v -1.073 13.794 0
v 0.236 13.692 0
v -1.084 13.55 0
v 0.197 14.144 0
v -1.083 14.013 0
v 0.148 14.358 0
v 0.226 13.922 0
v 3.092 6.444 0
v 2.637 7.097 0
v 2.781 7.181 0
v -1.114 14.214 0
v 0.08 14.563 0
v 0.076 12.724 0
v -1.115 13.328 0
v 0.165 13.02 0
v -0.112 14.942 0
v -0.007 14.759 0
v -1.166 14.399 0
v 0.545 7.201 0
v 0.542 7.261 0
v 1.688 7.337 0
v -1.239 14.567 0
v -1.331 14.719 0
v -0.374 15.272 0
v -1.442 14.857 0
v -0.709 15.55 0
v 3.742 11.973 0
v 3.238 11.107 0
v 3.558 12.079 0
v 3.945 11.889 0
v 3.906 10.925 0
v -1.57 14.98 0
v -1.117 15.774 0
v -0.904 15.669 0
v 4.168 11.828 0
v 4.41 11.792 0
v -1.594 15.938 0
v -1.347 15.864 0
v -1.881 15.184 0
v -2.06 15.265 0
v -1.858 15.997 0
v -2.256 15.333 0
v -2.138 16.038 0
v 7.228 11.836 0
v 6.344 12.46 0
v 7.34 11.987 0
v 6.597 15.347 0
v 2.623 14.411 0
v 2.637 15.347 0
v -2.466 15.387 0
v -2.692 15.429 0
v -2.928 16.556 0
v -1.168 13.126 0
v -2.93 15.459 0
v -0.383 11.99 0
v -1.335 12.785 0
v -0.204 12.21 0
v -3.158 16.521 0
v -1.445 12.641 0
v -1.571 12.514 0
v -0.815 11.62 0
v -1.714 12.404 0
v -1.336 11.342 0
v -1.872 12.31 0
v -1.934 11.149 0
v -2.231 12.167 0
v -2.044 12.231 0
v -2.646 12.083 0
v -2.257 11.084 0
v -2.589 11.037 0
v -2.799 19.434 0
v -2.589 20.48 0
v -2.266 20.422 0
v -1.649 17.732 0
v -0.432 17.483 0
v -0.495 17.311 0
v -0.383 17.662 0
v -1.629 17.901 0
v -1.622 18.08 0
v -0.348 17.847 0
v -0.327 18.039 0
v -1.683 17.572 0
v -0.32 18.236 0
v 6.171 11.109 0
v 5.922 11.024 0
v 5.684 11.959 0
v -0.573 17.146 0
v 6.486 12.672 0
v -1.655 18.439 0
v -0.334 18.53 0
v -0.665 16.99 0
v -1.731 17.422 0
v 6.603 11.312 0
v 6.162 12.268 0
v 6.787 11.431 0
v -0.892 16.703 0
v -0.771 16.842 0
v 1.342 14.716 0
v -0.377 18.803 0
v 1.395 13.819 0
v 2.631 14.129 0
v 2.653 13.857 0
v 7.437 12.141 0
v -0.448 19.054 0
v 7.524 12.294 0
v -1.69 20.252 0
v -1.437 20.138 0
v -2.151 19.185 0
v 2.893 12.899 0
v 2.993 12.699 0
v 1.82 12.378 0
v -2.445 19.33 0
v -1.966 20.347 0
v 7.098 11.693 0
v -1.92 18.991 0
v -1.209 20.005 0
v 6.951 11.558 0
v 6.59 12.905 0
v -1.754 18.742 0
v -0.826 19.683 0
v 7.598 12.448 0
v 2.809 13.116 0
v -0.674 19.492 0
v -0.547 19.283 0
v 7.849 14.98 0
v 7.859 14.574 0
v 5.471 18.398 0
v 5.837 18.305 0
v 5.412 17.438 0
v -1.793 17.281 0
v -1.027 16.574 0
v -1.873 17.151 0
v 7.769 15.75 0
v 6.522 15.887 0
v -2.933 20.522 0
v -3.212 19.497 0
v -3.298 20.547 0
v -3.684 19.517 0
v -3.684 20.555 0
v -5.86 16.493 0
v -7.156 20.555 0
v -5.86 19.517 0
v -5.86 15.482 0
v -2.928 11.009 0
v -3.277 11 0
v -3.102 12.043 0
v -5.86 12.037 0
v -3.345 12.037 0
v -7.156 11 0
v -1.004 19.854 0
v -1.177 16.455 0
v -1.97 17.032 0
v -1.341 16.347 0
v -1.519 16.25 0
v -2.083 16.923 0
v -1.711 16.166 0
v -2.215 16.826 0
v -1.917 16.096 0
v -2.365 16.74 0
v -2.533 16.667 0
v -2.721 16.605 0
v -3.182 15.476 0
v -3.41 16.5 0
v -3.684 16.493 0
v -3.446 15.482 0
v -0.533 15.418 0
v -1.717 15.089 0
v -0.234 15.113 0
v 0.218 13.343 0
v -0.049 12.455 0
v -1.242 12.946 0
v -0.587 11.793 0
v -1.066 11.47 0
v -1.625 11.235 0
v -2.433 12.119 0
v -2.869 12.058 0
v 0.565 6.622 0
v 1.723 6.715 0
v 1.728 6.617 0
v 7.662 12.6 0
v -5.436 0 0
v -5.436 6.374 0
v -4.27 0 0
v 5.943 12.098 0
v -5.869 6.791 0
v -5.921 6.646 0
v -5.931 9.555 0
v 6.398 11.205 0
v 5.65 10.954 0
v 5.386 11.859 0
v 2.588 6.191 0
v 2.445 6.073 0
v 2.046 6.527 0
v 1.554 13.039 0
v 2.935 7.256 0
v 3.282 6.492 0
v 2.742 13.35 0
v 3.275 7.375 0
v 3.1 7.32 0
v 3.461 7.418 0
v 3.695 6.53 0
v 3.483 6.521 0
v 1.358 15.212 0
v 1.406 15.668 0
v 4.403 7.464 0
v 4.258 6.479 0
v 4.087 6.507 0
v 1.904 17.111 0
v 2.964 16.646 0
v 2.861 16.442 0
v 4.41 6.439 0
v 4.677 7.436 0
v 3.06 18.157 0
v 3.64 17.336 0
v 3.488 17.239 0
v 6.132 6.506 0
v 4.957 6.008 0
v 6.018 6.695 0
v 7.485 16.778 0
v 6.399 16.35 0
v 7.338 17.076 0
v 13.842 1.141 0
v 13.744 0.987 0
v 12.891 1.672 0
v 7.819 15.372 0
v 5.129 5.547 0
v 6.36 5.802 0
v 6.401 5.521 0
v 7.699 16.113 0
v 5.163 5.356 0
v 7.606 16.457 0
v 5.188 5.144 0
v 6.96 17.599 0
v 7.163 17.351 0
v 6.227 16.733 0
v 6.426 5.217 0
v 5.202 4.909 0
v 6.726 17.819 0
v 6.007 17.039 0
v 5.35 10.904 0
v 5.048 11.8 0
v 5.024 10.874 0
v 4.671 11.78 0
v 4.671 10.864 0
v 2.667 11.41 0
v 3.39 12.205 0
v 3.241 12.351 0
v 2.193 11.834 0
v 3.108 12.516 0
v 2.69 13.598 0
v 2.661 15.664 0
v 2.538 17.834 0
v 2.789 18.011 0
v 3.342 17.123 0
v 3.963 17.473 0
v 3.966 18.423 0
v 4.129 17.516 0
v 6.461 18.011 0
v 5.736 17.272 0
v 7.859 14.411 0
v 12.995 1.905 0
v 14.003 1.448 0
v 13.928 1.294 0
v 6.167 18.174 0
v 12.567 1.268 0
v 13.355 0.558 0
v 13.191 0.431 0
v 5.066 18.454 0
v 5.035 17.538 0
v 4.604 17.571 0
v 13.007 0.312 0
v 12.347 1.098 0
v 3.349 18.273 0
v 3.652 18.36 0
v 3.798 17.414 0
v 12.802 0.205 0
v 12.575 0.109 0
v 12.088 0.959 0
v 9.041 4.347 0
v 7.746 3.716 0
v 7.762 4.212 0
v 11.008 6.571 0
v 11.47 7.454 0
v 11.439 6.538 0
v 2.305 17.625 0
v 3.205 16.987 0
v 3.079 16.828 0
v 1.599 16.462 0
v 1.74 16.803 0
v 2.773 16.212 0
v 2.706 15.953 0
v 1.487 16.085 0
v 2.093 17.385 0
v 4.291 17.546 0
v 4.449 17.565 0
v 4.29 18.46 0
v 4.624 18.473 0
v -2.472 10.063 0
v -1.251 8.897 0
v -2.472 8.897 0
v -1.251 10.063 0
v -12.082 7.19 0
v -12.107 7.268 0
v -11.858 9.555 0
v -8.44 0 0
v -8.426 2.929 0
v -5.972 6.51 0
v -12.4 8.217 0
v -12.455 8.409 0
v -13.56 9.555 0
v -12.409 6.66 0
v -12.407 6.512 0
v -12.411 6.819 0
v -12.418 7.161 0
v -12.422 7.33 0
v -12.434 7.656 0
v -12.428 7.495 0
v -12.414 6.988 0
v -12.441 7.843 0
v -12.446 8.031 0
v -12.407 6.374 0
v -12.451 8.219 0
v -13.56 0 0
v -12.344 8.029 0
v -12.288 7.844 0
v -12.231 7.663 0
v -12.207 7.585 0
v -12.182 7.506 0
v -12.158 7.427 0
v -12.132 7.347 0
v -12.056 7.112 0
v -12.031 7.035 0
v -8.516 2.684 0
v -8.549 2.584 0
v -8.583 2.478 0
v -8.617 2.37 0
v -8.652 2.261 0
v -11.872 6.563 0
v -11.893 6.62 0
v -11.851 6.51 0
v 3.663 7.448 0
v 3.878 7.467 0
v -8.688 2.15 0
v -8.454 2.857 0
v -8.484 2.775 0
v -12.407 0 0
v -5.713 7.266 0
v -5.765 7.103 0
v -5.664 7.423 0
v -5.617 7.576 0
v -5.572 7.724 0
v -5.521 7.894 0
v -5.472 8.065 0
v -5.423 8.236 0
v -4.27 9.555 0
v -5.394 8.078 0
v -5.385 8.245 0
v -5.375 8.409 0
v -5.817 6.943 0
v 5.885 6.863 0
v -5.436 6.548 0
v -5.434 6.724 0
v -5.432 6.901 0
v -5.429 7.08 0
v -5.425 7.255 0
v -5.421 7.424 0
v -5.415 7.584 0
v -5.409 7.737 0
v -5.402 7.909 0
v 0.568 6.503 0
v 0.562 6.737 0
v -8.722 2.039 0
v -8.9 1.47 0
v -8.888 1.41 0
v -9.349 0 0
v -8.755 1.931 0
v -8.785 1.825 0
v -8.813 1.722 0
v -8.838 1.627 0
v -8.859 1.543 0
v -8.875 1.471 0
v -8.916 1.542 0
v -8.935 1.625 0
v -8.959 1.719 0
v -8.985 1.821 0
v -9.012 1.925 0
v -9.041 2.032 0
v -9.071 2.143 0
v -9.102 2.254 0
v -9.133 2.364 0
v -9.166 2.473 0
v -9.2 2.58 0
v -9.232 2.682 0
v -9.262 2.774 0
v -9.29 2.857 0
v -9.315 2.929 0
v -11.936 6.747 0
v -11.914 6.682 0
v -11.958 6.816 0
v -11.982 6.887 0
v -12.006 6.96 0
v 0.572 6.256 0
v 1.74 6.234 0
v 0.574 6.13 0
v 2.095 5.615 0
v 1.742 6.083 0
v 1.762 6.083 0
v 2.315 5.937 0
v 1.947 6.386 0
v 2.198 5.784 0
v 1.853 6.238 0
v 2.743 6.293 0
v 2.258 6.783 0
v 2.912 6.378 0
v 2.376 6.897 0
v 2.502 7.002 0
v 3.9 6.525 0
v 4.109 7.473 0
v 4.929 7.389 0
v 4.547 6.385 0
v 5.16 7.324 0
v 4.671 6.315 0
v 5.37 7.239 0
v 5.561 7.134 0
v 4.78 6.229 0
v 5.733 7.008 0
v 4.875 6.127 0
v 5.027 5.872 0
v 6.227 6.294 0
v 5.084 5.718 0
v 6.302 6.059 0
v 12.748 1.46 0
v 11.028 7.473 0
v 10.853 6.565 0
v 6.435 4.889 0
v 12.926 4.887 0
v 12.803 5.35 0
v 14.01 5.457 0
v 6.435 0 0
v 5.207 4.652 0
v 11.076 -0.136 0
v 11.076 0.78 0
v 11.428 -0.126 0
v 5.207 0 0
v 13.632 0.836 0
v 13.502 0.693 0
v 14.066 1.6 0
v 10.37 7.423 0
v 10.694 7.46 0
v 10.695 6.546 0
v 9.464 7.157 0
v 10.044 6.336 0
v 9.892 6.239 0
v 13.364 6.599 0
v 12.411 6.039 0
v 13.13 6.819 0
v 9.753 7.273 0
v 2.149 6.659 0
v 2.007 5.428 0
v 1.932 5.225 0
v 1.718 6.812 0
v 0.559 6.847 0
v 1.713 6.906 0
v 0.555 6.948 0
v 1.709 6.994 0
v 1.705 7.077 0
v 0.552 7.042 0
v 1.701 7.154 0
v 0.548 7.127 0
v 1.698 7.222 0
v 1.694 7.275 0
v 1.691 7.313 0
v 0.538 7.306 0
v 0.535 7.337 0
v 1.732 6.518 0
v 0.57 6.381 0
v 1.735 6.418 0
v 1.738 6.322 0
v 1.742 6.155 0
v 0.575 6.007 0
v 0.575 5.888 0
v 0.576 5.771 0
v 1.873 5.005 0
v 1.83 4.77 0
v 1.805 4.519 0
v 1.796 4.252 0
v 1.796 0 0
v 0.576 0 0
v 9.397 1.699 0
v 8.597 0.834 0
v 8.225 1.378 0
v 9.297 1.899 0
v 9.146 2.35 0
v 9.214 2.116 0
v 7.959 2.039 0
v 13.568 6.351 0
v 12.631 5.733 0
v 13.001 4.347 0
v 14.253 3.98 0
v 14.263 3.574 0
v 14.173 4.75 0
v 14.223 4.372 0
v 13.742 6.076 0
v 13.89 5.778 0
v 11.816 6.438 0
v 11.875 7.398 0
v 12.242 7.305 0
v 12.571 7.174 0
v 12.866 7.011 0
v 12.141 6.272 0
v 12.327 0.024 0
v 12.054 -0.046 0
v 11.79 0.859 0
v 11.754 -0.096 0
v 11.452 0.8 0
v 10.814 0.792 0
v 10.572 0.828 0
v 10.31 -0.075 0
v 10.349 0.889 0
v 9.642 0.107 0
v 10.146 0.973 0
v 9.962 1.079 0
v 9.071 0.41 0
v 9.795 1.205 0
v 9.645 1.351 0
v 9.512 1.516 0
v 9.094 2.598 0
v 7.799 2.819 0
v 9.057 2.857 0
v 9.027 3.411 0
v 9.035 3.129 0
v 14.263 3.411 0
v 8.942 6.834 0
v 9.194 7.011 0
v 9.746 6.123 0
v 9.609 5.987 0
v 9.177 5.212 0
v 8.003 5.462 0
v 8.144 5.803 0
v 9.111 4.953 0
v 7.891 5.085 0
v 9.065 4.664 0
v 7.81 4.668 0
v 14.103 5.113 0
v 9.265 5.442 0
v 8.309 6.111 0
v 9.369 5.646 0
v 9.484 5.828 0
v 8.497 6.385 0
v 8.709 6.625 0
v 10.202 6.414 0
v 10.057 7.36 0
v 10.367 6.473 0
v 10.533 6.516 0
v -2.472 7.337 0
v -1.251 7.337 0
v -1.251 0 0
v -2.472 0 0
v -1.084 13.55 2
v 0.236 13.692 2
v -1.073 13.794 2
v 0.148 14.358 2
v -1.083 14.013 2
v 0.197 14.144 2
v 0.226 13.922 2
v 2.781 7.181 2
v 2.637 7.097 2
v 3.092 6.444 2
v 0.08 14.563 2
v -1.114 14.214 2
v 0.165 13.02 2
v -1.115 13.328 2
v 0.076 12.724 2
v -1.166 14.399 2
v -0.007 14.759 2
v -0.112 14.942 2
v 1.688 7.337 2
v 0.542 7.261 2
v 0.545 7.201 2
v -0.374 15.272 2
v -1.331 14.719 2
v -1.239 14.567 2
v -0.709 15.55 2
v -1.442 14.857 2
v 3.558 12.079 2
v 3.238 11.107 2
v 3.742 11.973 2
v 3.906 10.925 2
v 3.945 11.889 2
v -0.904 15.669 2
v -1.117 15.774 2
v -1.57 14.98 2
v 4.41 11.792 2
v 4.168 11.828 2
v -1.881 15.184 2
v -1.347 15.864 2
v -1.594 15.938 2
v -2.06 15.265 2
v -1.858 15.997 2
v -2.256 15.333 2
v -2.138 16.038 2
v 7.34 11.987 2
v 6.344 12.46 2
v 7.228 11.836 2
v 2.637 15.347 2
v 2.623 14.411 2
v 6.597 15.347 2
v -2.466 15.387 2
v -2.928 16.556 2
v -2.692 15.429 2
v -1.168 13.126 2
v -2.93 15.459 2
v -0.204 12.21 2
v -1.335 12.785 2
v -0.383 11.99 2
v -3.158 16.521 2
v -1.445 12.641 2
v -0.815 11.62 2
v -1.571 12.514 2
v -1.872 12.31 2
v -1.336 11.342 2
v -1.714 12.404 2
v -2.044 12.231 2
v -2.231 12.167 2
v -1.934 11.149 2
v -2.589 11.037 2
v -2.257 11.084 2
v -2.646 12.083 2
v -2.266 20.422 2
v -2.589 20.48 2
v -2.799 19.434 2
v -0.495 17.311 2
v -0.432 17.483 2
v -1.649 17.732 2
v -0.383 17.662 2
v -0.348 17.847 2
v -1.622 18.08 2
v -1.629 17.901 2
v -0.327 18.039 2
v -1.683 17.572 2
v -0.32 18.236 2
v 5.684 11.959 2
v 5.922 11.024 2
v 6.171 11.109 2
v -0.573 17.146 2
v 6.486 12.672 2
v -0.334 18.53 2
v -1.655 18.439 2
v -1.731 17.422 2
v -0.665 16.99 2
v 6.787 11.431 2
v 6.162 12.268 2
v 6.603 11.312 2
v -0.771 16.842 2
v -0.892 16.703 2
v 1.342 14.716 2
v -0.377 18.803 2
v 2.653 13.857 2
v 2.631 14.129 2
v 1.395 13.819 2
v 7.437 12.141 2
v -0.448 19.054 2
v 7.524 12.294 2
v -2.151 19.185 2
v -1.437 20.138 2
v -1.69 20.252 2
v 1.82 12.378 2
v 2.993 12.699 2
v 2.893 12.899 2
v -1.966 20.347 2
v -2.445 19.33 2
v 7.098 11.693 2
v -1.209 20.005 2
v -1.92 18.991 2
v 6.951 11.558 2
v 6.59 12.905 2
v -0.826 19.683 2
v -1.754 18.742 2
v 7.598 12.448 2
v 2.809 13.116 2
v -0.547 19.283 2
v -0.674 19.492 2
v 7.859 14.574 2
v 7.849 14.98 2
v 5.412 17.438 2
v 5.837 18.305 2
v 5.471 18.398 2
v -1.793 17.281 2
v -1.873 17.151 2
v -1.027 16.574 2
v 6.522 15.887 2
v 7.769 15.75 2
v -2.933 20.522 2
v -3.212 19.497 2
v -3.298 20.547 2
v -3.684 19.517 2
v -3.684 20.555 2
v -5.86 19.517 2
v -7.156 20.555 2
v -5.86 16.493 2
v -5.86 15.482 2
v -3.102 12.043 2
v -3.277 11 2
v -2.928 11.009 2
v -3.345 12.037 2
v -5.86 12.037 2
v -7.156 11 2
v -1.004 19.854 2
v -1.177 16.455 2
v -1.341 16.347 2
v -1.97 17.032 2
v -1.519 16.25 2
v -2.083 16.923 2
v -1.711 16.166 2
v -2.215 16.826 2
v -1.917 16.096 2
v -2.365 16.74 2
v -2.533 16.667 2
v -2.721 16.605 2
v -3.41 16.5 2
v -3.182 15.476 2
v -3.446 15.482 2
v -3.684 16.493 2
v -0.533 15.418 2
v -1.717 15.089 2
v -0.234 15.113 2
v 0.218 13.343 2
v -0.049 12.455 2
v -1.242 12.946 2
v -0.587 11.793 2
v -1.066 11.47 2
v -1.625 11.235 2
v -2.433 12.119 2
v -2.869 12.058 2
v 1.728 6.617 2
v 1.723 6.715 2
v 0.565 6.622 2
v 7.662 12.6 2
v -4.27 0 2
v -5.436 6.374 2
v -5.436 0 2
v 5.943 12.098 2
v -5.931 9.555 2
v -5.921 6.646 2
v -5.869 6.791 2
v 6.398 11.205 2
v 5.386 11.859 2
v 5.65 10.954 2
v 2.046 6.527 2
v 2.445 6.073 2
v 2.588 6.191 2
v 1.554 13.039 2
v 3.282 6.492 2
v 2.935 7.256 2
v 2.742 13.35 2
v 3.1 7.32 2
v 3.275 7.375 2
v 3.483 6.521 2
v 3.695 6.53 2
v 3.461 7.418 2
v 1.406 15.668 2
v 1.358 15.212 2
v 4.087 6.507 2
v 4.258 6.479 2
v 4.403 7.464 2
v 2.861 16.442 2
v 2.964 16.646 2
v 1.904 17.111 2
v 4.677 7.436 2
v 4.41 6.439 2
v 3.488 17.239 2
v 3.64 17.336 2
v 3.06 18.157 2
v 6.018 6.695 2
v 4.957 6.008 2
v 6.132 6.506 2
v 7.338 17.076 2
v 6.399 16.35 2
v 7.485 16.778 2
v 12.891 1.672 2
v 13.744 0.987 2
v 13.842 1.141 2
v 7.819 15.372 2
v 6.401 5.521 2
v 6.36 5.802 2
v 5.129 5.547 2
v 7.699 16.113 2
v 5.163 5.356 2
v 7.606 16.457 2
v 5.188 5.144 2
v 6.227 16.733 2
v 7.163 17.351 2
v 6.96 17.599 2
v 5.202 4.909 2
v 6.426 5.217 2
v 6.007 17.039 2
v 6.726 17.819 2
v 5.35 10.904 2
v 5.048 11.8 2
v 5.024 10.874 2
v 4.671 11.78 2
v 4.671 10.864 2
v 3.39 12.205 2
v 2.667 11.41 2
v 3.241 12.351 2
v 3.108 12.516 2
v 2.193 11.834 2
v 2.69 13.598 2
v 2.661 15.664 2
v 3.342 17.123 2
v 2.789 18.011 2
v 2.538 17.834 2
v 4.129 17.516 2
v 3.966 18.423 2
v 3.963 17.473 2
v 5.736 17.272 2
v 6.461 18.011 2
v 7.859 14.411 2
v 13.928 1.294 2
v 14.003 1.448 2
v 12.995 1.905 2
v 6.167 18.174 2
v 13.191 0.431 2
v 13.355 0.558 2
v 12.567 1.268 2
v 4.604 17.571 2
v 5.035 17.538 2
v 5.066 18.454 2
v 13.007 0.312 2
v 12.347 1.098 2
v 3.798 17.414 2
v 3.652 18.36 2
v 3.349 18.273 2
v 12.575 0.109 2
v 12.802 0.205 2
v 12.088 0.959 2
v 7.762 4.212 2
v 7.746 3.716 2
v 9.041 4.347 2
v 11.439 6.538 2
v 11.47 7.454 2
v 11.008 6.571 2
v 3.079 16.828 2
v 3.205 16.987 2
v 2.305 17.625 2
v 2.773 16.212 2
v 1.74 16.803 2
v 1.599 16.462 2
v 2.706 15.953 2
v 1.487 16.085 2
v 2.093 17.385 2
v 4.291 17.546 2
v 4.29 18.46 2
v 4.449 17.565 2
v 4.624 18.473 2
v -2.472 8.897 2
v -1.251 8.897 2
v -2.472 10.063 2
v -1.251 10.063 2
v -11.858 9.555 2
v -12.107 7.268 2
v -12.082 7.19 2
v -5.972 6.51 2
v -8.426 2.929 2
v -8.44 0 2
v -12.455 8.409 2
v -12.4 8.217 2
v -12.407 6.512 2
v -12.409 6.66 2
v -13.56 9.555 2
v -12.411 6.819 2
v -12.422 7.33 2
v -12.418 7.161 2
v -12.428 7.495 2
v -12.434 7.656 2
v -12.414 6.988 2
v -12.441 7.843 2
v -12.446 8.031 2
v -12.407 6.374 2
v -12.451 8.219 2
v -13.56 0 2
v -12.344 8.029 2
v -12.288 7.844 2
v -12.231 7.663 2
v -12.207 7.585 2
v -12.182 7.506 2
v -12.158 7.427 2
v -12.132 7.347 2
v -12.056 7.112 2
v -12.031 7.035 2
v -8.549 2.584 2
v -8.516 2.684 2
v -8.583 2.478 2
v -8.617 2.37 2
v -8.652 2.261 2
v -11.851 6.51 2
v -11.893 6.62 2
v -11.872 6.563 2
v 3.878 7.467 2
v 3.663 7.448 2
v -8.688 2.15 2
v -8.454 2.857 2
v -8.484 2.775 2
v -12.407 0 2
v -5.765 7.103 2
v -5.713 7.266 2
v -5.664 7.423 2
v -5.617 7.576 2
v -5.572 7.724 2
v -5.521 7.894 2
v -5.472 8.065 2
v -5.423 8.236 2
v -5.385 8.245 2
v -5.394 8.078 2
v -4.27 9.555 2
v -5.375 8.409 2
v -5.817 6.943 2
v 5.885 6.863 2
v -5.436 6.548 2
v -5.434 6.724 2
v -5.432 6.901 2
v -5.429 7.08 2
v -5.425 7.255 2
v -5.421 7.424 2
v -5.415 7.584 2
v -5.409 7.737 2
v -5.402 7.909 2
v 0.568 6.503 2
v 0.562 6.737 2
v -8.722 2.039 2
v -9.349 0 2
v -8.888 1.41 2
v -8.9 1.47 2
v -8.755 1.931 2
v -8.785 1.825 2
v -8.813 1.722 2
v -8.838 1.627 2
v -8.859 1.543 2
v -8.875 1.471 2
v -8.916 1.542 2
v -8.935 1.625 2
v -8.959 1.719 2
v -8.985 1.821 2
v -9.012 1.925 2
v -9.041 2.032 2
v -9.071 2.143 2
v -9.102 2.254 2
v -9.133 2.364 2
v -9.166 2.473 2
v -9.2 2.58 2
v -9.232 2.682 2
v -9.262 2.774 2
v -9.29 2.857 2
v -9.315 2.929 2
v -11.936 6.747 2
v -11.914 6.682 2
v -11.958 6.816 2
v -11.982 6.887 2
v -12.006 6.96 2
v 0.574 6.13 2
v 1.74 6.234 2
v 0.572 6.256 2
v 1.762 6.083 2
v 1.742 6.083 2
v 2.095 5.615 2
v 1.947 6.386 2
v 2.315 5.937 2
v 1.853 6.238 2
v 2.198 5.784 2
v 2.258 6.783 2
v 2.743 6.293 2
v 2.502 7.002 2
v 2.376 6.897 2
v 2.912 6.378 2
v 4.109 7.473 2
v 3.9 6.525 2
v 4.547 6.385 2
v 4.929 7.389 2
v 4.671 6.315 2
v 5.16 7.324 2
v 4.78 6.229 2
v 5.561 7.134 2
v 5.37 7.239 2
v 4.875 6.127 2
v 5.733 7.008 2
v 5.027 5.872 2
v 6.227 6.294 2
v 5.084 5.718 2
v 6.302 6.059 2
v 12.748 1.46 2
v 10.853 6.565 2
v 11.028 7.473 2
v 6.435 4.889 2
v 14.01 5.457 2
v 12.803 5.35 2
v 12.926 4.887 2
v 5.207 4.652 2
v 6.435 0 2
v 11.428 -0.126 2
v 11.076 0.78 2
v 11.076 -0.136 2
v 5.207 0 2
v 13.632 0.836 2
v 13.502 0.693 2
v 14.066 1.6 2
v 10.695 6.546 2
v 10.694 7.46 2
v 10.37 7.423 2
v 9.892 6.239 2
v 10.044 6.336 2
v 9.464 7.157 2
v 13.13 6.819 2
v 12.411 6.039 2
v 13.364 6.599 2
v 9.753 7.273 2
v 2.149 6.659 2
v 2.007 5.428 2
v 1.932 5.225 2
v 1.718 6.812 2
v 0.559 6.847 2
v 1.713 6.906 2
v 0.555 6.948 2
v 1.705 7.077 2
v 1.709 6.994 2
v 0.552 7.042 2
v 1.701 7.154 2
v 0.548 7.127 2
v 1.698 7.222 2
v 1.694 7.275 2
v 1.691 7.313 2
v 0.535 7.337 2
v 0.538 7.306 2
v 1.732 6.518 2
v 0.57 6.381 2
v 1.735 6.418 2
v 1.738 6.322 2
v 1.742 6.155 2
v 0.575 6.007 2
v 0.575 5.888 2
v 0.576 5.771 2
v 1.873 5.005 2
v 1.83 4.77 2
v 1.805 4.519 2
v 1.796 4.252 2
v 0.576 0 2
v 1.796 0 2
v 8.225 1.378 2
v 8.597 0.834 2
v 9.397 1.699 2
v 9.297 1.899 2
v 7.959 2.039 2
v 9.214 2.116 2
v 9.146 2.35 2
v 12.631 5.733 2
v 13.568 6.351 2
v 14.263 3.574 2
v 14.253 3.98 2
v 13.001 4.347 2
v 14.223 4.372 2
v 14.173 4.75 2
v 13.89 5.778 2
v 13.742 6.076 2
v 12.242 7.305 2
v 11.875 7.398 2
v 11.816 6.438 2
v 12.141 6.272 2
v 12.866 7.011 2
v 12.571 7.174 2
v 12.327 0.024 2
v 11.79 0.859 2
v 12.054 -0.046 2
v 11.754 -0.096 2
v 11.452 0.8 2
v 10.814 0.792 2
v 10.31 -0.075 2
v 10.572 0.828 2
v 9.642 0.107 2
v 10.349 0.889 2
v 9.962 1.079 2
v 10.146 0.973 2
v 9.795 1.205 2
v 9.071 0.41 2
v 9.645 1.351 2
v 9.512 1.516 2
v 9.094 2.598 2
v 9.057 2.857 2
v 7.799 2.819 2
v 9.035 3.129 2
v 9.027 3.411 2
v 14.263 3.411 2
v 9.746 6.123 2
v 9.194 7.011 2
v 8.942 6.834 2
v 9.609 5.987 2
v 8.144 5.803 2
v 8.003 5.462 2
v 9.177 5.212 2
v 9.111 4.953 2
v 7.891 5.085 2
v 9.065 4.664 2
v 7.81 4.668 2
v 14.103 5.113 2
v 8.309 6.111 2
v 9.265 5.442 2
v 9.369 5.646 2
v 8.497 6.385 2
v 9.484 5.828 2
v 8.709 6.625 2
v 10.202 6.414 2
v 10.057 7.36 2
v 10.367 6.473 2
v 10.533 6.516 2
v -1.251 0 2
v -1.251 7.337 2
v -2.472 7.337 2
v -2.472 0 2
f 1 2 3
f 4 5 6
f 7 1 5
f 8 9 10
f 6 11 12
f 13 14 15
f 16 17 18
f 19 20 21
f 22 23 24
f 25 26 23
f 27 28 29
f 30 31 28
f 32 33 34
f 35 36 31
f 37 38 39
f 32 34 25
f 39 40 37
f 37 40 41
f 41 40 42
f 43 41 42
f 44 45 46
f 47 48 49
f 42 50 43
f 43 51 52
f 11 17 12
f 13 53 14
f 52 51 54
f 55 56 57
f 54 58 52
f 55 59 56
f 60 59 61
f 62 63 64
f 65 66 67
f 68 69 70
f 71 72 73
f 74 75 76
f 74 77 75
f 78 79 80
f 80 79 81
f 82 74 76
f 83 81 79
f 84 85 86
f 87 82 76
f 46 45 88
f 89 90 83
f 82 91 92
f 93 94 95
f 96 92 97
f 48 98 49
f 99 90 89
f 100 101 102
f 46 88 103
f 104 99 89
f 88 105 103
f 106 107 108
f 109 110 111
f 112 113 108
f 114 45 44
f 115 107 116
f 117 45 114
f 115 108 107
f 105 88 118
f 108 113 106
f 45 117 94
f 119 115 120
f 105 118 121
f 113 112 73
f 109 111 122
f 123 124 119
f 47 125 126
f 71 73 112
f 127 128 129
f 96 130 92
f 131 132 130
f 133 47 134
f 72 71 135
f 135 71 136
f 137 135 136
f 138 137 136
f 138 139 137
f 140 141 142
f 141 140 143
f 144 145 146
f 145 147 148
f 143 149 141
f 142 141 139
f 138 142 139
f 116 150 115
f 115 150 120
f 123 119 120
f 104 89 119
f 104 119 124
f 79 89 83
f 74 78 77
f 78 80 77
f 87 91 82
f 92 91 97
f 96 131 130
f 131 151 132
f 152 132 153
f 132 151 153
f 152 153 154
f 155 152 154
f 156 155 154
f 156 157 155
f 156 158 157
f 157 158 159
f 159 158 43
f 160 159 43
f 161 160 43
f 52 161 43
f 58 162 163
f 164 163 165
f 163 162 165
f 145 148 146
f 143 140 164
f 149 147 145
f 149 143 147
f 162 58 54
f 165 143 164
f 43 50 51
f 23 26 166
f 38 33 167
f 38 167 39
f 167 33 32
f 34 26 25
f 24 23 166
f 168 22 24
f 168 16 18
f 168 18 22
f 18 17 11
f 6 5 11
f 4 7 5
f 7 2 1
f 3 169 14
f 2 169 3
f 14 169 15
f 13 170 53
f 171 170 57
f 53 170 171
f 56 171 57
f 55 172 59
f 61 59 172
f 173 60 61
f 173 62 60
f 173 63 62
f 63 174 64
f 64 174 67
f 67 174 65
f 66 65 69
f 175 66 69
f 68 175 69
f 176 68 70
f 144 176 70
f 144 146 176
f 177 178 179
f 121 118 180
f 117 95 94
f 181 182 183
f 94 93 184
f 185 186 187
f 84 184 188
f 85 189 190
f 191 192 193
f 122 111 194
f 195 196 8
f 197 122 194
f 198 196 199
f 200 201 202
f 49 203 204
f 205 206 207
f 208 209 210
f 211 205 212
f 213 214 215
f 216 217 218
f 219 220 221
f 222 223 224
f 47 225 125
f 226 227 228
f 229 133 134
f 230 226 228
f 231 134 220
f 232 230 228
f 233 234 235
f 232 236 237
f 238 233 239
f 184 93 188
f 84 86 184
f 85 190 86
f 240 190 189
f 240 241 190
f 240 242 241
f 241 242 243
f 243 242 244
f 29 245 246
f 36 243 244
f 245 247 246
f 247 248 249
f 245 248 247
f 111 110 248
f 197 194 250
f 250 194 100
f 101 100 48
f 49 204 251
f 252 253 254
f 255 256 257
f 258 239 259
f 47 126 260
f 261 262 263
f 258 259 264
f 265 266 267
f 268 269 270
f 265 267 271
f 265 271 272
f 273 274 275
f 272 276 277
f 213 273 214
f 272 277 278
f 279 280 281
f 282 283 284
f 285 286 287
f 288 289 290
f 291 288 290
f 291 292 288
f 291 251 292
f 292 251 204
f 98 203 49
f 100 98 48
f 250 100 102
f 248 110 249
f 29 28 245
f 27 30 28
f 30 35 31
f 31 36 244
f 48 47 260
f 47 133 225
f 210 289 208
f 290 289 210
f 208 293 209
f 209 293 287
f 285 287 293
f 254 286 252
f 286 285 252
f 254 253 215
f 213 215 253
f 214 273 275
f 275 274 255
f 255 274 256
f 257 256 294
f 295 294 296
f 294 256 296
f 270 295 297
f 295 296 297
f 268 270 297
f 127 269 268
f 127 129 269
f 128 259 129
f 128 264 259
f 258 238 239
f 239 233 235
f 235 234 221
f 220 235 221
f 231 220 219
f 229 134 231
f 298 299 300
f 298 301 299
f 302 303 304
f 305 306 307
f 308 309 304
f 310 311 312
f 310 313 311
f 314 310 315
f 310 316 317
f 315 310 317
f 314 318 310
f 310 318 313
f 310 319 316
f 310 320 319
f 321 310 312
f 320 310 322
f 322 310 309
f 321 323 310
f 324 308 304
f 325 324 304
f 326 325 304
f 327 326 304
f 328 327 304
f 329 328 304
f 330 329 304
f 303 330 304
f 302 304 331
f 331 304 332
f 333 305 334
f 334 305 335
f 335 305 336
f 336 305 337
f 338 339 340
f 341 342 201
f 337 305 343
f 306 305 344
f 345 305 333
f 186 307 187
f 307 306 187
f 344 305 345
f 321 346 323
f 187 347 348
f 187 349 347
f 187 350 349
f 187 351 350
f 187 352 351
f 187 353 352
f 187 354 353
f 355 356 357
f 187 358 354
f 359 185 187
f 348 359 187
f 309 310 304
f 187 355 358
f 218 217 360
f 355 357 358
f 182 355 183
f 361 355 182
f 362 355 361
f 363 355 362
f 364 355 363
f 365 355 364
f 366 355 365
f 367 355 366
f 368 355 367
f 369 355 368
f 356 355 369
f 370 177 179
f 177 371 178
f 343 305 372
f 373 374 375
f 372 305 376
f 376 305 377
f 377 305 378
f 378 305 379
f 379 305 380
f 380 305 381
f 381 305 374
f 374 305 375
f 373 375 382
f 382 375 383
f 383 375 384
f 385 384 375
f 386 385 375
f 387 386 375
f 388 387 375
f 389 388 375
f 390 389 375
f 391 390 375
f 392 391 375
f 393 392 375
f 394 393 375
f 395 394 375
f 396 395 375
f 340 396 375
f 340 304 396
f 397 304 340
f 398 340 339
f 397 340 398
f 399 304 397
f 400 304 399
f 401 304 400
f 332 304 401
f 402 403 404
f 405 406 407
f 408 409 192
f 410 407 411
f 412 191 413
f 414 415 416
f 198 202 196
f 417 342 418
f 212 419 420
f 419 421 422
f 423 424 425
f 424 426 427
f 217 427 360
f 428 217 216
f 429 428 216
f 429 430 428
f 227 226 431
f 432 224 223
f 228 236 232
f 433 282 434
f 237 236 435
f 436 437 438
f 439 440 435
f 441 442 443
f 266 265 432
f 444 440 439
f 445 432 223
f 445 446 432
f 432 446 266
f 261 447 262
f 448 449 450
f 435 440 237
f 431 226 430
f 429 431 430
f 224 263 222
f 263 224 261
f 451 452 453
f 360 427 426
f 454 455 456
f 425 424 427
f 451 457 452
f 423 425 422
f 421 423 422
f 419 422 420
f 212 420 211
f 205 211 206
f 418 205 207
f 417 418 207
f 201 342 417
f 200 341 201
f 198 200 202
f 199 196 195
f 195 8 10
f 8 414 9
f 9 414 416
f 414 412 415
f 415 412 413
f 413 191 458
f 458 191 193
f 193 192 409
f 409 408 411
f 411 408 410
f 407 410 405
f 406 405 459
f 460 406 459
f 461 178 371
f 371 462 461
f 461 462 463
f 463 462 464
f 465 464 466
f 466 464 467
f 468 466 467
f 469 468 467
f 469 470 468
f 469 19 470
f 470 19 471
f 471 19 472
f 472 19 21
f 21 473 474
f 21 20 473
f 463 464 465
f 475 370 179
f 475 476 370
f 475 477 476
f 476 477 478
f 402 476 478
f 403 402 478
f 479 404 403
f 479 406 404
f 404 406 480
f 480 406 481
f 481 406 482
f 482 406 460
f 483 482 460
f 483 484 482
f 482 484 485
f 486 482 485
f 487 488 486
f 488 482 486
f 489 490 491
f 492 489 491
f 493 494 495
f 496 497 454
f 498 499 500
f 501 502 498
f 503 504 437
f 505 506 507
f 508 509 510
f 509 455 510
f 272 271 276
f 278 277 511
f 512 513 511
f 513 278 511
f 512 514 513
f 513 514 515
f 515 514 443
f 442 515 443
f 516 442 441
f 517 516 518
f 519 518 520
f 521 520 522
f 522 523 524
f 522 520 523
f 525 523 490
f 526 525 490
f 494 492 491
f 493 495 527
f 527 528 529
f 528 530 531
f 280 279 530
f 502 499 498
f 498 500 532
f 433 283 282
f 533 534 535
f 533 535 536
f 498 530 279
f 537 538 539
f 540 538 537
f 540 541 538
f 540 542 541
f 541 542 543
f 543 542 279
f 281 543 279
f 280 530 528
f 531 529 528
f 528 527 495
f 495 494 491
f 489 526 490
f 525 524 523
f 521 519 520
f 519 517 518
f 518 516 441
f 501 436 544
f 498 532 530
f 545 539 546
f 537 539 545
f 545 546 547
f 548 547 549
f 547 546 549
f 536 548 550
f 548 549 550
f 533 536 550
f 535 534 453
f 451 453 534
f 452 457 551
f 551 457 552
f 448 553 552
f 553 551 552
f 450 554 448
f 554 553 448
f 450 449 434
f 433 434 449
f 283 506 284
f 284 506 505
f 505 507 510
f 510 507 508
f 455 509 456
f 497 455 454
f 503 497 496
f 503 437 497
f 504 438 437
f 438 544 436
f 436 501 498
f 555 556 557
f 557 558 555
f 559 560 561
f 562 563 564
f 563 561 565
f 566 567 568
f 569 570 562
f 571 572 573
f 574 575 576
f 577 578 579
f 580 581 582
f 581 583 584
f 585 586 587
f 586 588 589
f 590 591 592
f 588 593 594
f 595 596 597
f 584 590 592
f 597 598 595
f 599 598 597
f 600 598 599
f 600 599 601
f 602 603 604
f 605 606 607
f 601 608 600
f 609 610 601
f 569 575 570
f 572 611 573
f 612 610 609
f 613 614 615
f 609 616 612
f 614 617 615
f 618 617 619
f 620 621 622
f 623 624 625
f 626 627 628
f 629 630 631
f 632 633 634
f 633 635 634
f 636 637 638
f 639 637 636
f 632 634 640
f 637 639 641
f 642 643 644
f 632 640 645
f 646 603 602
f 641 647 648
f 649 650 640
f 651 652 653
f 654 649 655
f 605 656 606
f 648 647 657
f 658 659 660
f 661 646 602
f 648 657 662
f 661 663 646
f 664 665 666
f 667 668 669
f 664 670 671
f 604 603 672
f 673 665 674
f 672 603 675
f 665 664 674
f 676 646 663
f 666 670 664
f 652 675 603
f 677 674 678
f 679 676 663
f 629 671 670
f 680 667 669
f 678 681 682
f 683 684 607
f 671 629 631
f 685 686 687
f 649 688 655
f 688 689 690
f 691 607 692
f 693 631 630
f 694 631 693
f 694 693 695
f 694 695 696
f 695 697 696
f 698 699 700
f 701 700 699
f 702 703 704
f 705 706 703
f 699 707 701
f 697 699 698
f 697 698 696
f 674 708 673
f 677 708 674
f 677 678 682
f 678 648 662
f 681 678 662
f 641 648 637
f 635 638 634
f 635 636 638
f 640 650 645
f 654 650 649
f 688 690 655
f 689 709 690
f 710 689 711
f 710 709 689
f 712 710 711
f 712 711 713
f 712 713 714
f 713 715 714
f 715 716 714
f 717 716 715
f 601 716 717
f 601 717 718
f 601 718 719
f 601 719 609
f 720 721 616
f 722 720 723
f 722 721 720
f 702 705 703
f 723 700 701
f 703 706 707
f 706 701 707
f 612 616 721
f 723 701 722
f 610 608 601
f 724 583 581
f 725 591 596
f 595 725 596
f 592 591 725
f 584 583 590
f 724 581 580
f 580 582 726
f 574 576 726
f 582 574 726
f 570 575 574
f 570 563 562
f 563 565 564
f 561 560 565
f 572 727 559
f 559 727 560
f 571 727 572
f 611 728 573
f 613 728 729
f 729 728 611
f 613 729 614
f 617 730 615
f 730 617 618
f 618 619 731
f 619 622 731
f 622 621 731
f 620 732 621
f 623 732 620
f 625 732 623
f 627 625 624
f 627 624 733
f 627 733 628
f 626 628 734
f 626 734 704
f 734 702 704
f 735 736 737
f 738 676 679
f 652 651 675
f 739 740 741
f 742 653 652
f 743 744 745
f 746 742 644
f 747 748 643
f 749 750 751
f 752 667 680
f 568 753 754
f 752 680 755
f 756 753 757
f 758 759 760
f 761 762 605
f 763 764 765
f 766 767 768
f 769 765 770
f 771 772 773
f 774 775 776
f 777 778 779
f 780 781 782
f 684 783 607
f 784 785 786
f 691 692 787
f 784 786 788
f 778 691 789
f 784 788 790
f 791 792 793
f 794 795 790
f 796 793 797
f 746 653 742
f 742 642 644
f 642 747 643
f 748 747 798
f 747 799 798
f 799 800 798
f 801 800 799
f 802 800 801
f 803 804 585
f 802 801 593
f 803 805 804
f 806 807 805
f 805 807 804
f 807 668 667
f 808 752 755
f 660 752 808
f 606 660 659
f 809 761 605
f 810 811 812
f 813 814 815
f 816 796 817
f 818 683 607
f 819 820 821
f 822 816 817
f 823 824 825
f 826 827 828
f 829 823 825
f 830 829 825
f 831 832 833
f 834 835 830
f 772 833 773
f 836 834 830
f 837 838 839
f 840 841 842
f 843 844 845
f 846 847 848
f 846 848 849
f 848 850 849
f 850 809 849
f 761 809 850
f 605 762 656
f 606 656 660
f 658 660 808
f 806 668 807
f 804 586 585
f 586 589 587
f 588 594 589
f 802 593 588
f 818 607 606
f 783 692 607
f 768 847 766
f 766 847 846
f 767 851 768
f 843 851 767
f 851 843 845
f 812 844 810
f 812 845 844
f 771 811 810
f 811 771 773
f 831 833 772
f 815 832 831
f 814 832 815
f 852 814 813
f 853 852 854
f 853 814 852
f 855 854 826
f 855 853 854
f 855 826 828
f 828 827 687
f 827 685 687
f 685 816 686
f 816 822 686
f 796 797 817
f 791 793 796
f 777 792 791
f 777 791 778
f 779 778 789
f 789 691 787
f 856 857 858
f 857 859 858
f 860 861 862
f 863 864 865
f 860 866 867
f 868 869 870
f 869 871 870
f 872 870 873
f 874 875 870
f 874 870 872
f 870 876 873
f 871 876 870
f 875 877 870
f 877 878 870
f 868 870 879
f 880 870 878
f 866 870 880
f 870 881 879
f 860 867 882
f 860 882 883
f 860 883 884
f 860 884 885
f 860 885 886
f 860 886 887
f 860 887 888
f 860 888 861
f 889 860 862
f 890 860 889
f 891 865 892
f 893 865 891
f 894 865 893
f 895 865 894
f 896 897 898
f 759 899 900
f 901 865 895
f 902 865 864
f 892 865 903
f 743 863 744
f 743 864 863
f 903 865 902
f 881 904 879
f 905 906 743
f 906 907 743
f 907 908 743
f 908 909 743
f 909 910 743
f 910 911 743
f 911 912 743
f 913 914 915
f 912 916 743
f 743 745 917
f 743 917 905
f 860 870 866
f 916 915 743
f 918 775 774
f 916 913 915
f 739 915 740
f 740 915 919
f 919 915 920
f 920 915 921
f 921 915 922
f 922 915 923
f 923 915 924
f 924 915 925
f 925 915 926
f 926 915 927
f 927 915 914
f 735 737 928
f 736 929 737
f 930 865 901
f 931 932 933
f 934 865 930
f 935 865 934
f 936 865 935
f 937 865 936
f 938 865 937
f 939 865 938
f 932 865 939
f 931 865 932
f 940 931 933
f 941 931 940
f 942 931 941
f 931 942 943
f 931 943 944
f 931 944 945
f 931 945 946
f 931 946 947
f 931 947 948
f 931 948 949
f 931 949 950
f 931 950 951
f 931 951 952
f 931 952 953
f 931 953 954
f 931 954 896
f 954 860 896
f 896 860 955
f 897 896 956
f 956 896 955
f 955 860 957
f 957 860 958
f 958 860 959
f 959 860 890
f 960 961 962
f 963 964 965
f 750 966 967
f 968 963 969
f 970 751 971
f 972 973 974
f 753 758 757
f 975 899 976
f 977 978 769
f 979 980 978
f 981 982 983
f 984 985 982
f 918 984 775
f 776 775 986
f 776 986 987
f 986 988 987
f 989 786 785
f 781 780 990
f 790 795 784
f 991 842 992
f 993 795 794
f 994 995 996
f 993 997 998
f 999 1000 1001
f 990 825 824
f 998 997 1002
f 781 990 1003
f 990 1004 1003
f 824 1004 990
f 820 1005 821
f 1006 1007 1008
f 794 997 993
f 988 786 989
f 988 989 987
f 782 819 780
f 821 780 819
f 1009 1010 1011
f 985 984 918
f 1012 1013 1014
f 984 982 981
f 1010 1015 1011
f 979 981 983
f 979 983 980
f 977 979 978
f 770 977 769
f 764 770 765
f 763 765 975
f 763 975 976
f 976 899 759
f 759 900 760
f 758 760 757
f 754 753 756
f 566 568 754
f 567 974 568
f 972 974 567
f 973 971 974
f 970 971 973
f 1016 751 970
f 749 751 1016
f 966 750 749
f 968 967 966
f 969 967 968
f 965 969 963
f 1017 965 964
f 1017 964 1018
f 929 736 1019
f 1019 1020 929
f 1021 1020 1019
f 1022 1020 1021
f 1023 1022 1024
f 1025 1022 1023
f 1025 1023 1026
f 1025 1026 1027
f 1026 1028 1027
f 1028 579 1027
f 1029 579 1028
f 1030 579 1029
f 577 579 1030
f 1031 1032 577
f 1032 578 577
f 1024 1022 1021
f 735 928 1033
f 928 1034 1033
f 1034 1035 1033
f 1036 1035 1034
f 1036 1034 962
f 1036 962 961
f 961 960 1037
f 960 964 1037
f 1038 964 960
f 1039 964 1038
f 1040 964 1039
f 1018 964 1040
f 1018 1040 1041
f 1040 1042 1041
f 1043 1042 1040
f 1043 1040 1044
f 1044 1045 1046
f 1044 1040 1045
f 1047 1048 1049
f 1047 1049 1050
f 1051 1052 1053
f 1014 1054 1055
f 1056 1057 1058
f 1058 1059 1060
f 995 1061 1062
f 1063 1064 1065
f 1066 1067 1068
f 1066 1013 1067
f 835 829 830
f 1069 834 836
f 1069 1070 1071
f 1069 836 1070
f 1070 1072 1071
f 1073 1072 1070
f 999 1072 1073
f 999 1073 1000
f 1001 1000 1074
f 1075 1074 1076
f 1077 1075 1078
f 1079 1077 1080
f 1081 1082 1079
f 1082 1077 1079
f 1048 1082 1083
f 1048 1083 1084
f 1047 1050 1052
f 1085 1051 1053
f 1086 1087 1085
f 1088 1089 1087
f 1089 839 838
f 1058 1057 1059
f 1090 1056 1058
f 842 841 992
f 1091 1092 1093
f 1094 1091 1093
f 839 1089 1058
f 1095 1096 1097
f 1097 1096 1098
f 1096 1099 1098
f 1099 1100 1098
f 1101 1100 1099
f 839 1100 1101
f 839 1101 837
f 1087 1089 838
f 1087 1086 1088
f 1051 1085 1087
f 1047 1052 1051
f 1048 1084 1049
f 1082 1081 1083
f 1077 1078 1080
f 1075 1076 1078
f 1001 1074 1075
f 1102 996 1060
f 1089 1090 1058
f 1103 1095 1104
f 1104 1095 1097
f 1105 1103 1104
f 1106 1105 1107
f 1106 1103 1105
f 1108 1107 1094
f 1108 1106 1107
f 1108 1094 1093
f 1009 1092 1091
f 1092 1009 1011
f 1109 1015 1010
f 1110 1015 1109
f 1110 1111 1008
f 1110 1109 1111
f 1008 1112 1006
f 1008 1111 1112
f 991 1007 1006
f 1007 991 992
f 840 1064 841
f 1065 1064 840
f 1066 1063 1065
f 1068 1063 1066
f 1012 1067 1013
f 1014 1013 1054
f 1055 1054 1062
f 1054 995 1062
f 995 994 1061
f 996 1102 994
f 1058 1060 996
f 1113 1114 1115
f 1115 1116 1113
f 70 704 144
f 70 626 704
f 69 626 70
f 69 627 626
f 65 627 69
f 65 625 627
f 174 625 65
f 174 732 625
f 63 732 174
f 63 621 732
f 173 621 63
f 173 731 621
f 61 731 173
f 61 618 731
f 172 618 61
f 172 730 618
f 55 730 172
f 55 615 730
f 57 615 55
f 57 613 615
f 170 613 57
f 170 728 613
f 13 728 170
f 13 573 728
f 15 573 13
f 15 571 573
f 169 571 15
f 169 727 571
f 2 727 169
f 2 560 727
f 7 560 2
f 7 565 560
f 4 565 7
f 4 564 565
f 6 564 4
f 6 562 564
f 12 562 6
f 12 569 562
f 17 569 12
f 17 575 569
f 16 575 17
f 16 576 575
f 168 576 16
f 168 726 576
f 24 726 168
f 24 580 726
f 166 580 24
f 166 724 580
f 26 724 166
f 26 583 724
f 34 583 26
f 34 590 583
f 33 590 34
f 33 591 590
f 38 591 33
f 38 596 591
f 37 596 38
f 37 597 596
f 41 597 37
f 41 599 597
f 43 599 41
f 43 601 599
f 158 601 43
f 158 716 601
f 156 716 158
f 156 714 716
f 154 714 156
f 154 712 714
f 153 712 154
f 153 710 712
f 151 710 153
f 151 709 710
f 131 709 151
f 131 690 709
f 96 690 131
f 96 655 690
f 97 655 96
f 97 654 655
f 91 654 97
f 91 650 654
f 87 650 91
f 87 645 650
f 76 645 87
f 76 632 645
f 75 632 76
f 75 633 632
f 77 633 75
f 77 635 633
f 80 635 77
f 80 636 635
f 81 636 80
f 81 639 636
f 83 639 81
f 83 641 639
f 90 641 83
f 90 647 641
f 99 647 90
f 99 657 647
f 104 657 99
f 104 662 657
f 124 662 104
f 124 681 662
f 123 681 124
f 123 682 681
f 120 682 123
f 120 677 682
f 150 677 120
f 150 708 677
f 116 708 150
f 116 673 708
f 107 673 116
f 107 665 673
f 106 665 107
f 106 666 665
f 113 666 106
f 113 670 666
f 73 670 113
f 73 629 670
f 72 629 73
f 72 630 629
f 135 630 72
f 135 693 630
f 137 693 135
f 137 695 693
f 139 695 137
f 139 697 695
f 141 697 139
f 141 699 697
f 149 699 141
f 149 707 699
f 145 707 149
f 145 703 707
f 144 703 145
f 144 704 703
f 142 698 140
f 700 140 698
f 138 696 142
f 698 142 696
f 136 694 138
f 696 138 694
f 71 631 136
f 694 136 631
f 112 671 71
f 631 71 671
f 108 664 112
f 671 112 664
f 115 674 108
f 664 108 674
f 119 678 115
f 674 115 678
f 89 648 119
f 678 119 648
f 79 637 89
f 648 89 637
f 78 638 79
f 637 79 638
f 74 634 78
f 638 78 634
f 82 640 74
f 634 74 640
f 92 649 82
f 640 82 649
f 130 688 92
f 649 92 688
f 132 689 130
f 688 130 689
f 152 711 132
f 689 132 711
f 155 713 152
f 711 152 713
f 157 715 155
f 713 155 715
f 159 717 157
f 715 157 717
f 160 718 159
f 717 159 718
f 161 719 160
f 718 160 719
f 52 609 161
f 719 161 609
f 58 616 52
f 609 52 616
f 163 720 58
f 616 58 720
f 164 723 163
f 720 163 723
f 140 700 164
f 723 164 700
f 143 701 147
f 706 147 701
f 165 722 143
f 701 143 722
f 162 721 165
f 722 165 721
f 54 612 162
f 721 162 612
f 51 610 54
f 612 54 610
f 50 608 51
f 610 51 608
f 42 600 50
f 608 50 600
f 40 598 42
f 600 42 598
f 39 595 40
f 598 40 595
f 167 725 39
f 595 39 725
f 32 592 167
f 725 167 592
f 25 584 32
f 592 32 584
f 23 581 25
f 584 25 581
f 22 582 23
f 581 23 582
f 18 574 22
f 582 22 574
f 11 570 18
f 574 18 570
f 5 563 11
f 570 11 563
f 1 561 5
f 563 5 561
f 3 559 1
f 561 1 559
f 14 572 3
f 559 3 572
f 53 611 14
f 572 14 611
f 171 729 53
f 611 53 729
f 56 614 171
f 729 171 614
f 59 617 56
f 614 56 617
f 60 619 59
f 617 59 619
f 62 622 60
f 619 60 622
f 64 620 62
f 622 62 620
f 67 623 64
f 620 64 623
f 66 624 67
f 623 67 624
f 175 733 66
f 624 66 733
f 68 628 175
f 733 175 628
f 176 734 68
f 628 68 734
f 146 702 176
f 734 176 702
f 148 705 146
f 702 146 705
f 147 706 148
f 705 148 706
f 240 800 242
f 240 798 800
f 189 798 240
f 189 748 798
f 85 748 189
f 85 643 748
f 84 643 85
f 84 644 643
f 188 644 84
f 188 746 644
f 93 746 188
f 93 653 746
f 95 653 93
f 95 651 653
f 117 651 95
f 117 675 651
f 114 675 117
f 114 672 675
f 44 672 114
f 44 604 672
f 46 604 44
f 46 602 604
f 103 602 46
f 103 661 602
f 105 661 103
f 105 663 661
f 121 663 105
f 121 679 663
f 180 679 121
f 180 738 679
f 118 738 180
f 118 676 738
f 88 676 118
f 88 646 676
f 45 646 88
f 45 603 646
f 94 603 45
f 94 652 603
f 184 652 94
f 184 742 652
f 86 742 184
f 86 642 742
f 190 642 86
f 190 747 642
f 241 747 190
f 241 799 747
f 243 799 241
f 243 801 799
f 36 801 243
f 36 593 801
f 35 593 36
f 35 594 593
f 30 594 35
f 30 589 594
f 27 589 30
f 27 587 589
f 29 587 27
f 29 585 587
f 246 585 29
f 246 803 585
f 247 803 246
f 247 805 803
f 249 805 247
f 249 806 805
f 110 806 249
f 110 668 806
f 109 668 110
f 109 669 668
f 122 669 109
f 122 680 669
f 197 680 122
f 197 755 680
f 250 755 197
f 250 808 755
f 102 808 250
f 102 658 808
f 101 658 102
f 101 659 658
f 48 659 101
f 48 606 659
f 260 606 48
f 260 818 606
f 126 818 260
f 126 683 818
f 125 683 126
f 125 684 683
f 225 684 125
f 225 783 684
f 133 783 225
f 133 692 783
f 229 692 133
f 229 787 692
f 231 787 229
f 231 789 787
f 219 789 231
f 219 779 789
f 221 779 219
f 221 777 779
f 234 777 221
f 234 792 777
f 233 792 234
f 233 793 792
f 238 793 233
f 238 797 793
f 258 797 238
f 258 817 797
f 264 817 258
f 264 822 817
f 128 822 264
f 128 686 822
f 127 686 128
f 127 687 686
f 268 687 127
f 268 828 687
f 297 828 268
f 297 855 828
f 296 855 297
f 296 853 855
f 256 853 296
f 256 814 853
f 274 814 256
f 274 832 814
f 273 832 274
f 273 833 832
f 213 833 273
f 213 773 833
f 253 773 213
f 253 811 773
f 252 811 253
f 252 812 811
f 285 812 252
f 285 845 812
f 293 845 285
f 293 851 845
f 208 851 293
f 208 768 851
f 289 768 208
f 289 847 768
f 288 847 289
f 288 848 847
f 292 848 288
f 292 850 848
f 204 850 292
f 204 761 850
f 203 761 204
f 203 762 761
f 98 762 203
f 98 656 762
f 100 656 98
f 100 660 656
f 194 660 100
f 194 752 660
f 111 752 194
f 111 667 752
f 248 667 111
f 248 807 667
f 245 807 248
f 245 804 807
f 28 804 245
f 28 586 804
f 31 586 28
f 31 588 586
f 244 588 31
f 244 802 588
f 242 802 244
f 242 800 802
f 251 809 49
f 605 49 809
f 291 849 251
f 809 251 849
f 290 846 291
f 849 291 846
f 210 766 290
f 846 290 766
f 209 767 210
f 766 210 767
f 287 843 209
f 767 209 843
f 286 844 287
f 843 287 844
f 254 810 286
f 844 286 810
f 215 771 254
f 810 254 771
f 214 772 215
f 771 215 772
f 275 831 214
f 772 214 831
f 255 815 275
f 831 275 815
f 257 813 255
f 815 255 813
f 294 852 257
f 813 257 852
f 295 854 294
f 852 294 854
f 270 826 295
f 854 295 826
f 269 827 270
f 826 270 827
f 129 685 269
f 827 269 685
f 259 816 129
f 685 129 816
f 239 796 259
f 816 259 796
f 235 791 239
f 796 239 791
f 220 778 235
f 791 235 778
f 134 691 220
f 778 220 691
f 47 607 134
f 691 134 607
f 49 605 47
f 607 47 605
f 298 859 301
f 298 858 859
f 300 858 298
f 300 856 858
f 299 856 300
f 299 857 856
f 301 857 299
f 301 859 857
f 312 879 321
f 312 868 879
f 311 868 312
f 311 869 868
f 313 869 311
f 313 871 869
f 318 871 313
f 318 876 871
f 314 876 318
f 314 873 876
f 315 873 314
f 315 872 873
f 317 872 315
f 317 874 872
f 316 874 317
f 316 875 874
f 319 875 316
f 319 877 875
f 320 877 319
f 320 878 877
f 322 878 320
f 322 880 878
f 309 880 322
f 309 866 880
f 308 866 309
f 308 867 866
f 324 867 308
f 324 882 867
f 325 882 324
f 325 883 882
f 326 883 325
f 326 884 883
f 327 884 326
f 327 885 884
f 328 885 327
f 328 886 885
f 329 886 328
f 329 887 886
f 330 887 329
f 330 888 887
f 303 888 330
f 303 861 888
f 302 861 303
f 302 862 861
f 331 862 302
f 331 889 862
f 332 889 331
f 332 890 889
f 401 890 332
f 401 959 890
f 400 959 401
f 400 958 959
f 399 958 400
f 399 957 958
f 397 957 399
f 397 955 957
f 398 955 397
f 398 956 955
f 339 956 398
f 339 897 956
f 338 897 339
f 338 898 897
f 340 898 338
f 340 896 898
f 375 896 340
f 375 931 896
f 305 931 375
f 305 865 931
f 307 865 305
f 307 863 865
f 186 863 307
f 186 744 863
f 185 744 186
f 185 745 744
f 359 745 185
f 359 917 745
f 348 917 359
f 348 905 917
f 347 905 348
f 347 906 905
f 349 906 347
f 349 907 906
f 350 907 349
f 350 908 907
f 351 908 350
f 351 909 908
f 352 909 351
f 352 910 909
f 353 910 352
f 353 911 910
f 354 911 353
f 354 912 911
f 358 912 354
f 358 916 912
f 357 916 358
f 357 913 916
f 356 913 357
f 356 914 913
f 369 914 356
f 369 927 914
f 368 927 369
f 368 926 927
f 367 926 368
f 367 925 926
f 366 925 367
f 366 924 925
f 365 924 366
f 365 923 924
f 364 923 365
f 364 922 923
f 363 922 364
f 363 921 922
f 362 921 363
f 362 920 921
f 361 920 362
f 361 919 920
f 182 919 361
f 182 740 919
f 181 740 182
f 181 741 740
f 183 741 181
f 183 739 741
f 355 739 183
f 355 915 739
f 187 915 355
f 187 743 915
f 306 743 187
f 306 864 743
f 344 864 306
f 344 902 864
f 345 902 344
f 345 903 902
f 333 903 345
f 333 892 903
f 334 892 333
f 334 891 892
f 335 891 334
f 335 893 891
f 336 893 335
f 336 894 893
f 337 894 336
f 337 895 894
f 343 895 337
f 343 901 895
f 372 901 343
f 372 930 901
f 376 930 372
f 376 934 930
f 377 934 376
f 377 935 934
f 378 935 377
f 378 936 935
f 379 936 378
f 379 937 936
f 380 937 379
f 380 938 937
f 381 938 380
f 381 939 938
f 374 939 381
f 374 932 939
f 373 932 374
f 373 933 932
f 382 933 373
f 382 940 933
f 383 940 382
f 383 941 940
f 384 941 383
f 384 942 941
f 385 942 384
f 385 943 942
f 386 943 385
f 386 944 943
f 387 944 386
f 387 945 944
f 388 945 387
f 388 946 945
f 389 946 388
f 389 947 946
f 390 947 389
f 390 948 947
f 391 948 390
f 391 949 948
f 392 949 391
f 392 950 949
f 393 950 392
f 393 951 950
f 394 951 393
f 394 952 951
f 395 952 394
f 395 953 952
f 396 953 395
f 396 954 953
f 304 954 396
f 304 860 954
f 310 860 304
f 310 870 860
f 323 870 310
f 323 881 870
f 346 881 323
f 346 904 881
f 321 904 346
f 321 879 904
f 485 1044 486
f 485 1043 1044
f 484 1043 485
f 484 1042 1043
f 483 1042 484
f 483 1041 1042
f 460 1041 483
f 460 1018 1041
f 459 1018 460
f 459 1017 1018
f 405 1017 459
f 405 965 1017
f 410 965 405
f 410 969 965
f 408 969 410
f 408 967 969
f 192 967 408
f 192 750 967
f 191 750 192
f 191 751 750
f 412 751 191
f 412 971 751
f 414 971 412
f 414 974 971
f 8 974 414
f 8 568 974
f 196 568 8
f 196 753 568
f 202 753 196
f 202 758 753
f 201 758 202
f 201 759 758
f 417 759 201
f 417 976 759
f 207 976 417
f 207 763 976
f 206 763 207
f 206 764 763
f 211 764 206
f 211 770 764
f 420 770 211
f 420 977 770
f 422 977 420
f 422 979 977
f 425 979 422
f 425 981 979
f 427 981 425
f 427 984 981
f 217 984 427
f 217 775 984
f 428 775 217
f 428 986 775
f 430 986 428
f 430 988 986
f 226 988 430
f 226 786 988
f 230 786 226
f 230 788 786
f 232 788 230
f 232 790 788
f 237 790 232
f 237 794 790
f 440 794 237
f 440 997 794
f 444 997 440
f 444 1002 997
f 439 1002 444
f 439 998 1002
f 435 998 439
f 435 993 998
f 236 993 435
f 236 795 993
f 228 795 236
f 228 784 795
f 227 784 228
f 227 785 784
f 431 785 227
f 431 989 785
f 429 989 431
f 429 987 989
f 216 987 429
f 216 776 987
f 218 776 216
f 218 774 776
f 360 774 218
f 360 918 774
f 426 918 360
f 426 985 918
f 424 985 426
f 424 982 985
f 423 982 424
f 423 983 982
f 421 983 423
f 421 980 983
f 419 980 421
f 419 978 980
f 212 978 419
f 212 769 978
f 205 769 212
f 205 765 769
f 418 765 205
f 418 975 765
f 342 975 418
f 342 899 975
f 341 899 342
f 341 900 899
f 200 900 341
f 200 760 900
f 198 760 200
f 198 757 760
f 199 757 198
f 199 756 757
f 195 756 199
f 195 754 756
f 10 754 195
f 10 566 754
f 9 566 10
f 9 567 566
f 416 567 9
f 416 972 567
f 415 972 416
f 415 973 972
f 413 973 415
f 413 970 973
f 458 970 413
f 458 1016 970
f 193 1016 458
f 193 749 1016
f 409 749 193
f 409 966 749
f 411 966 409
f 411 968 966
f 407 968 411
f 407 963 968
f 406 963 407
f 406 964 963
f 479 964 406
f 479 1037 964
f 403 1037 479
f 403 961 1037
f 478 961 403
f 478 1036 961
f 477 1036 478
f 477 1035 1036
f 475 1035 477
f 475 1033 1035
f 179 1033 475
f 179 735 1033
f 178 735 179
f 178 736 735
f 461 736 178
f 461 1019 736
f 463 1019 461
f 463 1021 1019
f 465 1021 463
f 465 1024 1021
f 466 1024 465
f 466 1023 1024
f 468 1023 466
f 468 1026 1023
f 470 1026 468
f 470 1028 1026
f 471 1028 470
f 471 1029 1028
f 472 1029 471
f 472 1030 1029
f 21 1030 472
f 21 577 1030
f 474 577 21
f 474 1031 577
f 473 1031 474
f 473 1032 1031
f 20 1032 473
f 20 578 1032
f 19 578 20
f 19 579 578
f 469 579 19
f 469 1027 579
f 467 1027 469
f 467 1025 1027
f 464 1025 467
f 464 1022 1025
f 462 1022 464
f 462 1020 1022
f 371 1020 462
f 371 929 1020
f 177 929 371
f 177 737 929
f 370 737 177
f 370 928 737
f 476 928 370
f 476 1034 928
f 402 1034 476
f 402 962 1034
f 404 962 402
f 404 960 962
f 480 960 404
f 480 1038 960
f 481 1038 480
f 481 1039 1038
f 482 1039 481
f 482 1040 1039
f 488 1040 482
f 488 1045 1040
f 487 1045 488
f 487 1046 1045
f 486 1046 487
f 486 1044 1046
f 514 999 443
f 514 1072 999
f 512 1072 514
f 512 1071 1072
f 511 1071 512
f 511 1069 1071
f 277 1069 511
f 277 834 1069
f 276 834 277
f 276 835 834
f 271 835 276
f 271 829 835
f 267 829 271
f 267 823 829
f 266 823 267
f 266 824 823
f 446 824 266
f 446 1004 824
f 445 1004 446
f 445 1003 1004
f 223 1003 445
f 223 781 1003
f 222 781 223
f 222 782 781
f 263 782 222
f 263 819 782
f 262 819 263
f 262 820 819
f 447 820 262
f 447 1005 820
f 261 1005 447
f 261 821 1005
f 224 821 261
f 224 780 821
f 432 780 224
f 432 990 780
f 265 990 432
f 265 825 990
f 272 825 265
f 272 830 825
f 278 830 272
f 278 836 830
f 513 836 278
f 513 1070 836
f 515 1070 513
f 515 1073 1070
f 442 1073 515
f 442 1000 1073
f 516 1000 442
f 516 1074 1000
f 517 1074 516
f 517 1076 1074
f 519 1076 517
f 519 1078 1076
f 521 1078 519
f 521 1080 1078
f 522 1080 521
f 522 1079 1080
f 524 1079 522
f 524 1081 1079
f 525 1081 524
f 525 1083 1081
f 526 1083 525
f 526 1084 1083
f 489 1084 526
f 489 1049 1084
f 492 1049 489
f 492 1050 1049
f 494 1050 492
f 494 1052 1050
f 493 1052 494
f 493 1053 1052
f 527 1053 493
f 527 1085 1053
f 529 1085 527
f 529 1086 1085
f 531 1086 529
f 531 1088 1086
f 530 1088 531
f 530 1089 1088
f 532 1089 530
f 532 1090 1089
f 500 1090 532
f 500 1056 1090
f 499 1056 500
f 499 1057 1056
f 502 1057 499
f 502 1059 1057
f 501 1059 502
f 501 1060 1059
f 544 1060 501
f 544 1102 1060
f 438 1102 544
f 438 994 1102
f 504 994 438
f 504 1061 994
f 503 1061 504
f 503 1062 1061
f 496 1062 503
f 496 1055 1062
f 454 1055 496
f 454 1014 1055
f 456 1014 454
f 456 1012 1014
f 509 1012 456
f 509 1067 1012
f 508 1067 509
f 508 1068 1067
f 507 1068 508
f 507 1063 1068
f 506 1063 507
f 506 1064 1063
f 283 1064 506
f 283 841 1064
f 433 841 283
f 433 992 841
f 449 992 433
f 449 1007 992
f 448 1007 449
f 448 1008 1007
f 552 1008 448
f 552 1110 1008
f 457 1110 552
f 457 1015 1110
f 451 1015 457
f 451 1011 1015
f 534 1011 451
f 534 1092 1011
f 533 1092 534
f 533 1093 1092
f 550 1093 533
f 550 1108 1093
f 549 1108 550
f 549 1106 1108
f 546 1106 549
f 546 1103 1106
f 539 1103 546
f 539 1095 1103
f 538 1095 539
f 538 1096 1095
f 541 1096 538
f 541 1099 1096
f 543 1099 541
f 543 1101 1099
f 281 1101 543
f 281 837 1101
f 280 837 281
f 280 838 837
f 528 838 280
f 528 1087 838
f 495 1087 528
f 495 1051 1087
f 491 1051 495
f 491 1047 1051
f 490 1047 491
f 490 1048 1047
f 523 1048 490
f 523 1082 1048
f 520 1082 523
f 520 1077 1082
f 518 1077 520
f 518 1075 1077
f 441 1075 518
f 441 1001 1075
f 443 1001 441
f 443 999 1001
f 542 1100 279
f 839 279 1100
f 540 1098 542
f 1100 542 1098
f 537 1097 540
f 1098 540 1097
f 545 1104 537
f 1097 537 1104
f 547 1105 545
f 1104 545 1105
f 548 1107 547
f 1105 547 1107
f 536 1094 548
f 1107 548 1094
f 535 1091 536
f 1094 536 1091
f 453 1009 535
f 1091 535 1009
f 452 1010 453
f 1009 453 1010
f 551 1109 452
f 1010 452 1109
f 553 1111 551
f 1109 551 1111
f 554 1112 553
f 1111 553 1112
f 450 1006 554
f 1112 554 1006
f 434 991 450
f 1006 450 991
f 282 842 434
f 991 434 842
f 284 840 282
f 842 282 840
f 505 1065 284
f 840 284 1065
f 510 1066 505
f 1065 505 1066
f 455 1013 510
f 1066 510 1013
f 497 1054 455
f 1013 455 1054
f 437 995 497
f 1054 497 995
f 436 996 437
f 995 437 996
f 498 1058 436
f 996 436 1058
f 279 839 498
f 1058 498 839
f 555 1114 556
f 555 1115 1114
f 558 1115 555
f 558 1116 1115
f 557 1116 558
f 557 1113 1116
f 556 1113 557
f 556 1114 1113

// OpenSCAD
linear_extrude(height = 2){
    translate([0,11,0]) 
        text("Be", halign = "center", font= "Helvetica:style=Normal");
    text("Mine", halign = "center", font= "Helvetica:style=Normal");
}
